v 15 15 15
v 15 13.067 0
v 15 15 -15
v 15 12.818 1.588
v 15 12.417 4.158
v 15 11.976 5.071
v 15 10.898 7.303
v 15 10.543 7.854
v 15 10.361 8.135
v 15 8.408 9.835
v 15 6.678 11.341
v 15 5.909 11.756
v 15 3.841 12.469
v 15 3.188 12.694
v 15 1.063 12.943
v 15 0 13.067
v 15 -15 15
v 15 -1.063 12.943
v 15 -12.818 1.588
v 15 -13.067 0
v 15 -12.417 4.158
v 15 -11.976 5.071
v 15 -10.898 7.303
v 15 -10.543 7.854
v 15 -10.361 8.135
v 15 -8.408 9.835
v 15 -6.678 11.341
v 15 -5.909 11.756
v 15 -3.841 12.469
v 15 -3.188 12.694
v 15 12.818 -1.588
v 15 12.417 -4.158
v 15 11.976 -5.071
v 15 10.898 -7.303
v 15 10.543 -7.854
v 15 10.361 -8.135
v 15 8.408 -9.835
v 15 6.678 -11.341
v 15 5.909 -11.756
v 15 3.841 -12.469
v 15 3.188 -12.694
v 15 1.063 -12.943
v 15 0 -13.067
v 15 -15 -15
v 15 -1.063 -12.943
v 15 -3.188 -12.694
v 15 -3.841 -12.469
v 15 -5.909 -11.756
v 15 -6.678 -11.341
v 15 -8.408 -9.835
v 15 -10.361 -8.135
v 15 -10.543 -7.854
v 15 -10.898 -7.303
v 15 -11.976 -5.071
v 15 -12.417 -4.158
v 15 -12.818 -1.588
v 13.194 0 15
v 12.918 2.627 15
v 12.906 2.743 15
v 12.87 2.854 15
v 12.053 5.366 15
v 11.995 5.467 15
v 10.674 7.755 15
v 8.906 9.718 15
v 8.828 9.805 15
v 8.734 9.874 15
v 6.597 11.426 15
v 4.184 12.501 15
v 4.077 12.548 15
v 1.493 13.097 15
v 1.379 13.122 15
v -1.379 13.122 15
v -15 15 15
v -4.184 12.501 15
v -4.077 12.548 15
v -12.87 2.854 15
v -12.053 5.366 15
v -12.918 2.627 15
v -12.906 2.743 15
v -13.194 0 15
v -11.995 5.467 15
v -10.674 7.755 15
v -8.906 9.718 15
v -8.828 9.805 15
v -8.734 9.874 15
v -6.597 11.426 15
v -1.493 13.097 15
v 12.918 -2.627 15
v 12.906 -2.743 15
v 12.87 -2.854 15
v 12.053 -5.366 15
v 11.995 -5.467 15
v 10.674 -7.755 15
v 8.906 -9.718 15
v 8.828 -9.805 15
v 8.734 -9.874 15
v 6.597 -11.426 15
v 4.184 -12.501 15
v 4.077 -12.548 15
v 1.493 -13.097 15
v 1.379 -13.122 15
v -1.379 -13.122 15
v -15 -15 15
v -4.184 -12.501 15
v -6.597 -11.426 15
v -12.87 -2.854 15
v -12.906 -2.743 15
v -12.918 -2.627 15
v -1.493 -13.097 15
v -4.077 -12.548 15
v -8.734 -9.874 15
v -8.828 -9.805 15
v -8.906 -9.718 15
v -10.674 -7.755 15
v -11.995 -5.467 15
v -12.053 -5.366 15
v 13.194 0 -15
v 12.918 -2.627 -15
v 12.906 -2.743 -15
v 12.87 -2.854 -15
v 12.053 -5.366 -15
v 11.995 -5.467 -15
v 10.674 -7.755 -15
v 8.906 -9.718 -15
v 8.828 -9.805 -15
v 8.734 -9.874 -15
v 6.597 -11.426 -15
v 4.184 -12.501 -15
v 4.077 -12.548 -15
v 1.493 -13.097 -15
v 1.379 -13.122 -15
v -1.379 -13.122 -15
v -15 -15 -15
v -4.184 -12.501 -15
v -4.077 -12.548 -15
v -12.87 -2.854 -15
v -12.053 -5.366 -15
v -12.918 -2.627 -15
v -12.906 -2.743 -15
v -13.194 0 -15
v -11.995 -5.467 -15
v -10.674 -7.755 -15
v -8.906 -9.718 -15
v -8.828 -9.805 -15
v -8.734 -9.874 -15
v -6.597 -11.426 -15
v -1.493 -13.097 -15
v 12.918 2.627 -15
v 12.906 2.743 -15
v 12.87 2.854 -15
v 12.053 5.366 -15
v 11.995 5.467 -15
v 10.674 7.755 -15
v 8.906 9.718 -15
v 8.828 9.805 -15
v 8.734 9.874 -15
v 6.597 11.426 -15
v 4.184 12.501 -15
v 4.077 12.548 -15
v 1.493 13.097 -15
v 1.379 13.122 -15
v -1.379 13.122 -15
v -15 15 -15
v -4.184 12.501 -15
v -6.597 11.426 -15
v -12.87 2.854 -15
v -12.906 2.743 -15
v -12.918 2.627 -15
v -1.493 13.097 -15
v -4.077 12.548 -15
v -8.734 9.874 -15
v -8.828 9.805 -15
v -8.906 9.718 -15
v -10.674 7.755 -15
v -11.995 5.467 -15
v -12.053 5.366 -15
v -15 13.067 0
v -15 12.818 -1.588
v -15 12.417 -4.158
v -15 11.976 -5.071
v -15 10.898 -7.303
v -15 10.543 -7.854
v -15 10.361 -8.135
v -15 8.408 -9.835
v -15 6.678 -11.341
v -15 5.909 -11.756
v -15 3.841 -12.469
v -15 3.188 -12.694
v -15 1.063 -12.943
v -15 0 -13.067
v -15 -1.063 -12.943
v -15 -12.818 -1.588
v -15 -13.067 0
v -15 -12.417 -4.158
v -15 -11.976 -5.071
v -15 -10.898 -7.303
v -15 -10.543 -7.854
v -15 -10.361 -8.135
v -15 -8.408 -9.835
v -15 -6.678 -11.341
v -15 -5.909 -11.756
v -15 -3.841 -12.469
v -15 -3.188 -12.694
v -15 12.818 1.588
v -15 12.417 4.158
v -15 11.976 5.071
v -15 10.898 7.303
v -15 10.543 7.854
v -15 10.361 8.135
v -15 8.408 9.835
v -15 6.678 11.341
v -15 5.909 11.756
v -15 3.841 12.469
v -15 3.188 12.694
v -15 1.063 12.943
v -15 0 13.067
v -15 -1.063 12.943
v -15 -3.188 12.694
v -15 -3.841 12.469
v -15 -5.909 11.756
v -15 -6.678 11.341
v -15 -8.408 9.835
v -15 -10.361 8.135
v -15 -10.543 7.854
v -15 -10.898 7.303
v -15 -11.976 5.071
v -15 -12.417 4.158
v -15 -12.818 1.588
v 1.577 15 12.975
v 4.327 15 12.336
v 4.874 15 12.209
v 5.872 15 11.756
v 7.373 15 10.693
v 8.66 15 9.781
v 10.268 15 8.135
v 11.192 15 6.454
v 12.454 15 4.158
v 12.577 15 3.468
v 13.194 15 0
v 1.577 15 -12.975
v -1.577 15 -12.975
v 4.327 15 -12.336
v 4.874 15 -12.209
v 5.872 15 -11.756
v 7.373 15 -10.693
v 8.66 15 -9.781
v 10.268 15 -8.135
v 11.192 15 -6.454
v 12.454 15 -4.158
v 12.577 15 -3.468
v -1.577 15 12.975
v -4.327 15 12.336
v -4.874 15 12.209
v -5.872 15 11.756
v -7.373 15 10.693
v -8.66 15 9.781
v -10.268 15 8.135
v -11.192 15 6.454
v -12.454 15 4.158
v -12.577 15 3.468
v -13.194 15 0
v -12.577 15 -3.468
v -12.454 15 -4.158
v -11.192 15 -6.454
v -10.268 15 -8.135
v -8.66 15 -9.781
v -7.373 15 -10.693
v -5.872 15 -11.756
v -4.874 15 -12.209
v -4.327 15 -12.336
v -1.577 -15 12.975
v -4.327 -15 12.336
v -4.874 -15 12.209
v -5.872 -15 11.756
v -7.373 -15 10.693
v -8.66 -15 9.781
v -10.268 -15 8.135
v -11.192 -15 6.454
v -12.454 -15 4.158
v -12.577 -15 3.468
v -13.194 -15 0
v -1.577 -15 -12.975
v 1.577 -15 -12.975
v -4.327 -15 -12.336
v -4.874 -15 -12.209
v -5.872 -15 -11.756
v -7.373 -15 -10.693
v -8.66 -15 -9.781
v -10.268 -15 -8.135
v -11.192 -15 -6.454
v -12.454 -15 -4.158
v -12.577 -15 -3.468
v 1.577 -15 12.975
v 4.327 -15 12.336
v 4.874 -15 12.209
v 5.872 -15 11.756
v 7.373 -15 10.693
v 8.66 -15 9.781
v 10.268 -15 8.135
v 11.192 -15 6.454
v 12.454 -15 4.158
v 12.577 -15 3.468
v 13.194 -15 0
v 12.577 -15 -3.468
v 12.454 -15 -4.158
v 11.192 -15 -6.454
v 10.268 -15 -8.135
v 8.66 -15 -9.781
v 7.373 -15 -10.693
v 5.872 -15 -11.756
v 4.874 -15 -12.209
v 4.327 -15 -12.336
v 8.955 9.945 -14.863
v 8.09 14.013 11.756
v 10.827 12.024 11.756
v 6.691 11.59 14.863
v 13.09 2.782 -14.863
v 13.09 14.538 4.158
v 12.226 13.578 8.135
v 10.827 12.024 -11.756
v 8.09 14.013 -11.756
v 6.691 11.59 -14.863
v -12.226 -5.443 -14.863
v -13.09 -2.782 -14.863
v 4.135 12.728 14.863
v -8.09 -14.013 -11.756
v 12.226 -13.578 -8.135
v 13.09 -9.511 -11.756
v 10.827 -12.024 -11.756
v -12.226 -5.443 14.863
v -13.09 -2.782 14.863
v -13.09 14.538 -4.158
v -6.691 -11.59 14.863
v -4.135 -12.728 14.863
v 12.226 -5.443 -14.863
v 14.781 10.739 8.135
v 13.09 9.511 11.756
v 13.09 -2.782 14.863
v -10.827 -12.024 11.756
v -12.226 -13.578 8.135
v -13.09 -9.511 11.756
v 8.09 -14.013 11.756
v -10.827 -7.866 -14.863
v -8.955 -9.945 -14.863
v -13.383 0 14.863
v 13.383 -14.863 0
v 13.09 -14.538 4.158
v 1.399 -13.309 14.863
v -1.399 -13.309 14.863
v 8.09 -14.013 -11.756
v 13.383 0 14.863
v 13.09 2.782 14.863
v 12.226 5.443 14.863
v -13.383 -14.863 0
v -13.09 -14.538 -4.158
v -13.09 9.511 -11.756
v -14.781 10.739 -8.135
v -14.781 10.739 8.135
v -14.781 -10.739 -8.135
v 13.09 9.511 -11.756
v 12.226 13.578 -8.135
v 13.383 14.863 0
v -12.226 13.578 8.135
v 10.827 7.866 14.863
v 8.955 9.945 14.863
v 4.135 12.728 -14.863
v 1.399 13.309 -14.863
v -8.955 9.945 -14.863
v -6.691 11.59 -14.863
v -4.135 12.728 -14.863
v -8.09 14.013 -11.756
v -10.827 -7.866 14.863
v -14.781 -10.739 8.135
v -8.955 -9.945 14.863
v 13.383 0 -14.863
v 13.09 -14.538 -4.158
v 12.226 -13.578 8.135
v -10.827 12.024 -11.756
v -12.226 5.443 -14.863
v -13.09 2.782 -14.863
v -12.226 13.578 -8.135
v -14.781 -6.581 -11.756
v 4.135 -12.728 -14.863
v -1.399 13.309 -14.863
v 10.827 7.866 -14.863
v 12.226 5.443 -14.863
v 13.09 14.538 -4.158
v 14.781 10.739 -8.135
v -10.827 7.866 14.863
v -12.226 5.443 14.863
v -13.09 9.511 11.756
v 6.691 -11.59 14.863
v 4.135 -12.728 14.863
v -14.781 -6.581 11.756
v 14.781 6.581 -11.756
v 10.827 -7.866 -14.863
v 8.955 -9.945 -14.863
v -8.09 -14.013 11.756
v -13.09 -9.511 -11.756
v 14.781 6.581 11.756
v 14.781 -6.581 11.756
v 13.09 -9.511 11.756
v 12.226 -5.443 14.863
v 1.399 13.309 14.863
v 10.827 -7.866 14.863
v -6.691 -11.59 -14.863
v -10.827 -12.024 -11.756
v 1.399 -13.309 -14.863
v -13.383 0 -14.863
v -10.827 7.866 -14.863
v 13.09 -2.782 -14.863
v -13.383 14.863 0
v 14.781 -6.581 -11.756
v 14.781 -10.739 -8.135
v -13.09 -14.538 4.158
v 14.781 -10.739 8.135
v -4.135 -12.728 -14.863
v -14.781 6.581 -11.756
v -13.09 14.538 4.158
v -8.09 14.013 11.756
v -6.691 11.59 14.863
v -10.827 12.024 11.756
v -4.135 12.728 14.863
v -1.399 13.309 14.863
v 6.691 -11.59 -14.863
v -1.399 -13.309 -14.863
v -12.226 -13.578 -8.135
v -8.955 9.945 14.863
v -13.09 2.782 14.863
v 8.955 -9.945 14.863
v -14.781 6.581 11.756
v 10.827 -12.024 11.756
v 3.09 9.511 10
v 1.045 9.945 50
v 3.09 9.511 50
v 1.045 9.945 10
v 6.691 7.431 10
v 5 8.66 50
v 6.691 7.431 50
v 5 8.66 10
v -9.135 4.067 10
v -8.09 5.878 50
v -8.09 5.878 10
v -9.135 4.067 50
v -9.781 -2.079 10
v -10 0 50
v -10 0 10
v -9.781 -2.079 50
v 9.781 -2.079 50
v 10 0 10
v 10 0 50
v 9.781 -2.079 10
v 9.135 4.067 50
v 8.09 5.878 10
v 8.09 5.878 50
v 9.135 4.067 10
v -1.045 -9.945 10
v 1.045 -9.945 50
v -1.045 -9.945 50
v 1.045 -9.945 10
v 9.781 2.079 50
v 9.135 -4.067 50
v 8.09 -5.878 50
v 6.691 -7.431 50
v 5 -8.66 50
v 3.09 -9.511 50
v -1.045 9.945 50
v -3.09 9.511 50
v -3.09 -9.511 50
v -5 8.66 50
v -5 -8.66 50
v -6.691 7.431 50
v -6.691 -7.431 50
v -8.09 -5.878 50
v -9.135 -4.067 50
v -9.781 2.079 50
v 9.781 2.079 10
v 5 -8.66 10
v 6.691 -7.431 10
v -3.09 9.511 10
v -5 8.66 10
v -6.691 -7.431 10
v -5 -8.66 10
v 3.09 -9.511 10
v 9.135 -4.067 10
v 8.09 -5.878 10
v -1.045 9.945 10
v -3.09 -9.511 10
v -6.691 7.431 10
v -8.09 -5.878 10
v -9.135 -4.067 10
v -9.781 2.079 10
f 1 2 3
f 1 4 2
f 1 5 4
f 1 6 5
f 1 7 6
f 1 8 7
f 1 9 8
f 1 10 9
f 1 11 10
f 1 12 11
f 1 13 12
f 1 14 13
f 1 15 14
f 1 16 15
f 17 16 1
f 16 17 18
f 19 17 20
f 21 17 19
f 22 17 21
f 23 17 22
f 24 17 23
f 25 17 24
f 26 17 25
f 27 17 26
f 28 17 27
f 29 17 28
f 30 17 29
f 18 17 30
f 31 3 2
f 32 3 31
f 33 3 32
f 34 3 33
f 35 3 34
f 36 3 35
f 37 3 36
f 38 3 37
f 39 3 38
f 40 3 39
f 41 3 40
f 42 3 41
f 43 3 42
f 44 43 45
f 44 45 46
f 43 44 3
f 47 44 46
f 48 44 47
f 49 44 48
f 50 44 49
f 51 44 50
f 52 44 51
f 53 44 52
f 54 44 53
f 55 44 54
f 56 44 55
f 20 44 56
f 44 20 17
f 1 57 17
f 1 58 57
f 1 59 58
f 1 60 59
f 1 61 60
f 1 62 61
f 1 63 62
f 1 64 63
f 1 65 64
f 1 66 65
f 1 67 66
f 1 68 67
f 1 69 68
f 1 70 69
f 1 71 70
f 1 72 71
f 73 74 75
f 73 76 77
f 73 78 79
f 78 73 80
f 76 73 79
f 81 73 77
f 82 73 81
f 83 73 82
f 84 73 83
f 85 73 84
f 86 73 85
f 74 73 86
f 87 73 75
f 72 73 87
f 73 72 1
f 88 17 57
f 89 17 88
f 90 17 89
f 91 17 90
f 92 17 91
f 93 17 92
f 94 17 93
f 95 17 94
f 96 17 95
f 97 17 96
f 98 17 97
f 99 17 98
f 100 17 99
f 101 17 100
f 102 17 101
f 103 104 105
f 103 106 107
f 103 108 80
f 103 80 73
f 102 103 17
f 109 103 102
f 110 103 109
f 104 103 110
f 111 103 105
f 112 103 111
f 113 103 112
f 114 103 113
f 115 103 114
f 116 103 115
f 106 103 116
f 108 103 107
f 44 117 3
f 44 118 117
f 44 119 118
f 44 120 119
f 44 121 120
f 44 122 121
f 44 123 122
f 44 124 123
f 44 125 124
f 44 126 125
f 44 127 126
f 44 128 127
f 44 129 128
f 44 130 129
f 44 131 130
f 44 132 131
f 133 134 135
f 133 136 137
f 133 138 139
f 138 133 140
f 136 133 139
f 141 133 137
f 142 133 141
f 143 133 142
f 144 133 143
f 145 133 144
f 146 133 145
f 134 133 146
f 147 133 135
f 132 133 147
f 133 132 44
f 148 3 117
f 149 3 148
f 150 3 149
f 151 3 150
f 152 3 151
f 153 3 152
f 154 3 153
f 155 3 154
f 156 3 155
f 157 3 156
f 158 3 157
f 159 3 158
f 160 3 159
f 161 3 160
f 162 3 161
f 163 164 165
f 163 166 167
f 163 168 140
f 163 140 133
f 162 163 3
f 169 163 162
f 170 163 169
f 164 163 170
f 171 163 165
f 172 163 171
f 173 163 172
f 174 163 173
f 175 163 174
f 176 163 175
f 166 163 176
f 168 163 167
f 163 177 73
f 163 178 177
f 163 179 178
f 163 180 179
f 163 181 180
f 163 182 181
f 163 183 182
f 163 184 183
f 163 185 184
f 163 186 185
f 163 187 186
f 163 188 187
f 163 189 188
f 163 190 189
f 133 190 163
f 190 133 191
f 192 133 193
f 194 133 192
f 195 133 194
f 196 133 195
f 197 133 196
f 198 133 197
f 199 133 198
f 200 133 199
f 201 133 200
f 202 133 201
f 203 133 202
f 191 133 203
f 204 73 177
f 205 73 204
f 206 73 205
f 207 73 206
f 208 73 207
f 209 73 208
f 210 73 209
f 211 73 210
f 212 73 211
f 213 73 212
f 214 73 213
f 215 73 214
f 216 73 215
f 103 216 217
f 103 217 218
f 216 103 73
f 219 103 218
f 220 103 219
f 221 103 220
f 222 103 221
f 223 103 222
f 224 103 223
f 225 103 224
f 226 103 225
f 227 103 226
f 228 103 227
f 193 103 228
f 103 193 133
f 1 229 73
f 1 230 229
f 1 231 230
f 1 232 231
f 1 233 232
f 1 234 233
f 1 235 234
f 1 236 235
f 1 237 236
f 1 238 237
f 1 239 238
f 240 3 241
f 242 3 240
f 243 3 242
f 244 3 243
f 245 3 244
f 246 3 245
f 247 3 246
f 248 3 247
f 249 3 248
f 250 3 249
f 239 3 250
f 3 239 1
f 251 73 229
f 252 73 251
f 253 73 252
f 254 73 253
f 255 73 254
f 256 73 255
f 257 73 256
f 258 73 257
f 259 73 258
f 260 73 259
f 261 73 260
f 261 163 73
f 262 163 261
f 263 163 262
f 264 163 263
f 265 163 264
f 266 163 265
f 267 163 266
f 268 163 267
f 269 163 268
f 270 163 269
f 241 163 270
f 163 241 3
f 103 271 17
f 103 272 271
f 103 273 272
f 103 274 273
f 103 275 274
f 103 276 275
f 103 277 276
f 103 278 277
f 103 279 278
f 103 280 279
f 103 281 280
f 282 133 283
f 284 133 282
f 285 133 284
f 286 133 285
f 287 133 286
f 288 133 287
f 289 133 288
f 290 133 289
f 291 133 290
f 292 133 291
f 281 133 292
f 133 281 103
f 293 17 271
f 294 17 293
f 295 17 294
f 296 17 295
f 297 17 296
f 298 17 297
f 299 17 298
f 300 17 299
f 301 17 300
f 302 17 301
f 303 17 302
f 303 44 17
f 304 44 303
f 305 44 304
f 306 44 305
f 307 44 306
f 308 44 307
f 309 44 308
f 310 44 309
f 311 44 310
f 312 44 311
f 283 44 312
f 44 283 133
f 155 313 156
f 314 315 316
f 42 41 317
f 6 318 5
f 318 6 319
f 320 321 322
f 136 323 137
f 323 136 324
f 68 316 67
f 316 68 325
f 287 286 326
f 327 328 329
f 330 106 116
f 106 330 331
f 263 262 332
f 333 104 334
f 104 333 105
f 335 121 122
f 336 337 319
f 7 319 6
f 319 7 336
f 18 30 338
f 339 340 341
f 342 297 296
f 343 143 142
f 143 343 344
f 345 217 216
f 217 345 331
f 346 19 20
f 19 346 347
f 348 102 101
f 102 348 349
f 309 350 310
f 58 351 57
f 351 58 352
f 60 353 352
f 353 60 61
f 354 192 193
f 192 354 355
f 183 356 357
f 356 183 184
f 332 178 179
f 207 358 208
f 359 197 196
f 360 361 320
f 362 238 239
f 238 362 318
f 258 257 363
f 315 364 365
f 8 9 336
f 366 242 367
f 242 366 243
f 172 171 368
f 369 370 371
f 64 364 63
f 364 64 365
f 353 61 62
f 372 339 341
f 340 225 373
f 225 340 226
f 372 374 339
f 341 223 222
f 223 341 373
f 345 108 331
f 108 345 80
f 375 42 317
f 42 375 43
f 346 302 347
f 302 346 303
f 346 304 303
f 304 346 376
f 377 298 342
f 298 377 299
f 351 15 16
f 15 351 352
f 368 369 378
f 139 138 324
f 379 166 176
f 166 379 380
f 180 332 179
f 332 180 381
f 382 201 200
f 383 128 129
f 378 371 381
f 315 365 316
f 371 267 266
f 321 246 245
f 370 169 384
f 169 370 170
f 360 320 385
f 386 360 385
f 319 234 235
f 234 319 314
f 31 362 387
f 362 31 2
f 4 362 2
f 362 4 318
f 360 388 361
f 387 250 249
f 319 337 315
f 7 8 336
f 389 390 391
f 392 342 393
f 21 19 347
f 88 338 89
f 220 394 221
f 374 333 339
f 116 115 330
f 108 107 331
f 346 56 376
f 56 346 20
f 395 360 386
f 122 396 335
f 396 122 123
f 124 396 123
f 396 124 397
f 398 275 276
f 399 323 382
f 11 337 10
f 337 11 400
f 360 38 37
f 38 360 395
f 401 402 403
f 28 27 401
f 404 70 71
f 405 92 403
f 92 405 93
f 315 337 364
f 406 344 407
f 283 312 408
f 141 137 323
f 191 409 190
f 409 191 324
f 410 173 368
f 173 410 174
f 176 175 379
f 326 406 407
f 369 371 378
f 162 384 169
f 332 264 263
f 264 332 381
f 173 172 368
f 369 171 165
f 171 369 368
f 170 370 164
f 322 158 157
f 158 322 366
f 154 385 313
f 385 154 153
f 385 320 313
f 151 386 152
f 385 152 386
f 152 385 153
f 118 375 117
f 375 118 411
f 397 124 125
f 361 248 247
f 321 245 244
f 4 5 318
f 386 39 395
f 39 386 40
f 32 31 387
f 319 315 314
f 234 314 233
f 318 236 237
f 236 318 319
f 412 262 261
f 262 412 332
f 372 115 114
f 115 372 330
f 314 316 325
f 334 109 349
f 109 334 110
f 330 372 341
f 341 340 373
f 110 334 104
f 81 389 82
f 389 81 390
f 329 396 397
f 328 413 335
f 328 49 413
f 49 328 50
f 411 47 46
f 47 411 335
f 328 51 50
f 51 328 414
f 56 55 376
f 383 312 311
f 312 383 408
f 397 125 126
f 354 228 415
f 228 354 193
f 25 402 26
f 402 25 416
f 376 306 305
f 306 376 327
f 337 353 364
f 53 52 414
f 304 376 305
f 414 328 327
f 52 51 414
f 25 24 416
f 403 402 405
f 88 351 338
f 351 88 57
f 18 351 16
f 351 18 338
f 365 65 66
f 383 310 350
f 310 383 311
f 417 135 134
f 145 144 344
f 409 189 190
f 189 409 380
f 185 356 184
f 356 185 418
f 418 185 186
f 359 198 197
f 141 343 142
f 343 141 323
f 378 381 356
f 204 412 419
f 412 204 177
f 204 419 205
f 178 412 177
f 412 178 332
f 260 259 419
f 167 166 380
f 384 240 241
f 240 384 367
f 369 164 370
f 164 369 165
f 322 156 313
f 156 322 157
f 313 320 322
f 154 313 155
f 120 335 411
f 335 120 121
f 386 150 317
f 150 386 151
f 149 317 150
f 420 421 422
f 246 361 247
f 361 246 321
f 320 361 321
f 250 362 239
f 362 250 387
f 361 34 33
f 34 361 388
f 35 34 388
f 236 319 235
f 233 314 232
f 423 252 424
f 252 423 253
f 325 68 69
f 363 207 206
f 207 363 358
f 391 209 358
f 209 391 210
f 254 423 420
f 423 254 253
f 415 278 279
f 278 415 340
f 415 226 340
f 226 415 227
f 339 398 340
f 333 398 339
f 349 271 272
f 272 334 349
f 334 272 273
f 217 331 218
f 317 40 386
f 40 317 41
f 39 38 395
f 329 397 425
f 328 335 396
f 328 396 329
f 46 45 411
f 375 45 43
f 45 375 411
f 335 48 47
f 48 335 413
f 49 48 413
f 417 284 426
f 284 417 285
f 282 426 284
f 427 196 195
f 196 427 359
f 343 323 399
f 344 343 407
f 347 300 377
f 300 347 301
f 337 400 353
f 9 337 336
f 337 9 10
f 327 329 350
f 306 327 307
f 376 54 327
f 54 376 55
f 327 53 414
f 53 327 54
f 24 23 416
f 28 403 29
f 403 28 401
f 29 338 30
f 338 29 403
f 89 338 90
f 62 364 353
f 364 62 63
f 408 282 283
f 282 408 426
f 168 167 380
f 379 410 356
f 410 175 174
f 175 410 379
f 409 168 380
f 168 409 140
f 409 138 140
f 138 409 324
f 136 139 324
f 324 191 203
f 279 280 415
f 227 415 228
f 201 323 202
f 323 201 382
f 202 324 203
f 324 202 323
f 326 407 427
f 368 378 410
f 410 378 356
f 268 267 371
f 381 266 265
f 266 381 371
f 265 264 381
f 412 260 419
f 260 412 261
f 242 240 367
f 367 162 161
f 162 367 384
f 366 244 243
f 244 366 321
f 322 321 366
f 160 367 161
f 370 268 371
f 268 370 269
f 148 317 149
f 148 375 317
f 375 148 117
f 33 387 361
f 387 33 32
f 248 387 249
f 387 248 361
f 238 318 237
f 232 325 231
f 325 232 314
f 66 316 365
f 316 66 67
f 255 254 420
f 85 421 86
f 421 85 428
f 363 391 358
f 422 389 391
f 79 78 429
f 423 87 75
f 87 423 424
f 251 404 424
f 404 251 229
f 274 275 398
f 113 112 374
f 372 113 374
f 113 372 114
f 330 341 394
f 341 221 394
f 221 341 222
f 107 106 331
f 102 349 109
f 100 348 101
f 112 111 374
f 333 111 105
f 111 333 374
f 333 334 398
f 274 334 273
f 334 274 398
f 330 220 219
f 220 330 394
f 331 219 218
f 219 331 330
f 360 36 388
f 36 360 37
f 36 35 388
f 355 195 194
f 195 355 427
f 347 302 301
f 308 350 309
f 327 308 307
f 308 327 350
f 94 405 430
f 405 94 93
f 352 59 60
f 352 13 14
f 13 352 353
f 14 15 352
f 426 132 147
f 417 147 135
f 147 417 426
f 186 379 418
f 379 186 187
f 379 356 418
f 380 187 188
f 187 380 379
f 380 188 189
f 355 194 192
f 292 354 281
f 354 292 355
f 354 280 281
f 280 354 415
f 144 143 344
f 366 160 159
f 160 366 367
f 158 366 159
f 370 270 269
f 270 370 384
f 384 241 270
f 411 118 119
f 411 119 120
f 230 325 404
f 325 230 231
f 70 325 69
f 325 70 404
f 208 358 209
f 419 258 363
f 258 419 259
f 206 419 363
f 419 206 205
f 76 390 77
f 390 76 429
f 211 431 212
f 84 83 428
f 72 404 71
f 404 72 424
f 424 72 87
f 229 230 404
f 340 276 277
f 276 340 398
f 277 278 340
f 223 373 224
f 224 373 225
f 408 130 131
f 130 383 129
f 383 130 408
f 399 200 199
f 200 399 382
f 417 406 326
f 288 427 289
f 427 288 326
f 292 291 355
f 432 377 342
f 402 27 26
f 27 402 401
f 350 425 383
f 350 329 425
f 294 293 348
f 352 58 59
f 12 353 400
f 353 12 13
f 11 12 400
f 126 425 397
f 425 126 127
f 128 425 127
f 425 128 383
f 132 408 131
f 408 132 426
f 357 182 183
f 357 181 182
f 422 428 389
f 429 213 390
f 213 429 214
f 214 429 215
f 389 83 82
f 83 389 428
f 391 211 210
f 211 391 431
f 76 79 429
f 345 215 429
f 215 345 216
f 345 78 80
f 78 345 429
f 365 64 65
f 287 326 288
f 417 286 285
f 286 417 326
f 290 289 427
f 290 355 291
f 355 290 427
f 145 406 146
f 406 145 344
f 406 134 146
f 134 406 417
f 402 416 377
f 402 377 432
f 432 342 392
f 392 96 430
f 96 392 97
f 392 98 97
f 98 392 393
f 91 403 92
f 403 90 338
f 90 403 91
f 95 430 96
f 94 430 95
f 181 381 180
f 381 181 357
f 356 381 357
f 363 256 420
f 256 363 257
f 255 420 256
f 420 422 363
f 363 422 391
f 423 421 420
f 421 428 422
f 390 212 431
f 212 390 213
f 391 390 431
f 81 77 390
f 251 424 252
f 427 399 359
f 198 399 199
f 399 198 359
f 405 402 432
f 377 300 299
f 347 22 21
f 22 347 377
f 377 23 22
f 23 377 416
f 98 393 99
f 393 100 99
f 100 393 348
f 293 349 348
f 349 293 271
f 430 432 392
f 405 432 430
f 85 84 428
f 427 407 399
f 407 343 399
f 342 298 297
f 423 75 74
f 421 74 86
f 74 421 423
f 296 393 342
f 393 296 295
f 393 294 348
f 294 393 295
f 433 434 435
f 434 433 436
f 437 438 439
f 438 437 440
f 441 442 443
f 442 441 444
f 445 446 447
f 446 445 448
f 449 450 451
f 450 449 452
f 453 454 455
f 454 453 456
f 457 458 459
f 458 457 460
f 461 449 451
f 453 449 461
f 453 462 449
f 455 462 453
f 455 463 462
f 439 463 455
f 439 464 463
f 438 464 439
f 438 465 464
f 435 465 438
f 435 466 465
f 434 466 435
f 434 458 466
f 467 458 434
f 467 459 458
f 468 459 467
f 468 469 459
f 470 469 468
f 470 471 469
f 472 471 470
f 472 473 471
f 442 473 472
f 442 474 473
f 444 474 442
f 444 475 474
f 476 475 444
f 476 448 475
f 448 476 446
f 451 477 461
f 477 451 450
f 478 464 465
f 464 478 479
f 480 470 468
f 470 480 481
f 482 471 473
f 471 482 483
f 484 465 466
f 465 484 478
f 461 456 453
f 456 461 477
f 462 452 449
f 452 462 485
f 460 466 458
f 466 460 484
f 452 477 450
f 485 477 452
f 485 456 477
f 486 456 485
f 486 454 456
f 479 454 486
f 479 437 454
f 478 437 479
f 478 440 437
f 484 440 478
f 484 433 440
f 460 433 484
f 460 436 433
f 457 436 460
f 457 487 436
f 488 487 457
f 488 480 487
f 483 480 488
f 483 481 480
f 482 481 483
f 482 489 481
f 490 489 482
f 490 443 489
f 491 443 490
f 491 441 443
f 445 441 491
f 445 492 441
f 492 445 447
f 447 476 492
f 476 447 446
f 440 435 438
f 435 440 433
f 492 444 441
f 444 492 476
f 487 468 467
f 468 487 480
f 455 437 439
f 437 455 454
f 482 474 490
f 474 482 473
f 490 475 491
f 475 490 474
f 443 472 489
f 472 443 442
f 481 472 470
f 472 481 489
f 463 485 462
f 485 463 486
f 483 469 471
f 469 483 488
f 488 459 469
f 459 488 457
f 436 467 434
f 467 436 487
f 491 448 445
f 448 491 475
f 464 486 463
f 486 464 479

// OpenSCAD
difference() {
        color([0.8,0.6,0.9]) 
		cube(30, center=true);
        sphere(20);
 }
 translate([0, 0, 10]) {
        cylinder(h=40, r=10);
 }
